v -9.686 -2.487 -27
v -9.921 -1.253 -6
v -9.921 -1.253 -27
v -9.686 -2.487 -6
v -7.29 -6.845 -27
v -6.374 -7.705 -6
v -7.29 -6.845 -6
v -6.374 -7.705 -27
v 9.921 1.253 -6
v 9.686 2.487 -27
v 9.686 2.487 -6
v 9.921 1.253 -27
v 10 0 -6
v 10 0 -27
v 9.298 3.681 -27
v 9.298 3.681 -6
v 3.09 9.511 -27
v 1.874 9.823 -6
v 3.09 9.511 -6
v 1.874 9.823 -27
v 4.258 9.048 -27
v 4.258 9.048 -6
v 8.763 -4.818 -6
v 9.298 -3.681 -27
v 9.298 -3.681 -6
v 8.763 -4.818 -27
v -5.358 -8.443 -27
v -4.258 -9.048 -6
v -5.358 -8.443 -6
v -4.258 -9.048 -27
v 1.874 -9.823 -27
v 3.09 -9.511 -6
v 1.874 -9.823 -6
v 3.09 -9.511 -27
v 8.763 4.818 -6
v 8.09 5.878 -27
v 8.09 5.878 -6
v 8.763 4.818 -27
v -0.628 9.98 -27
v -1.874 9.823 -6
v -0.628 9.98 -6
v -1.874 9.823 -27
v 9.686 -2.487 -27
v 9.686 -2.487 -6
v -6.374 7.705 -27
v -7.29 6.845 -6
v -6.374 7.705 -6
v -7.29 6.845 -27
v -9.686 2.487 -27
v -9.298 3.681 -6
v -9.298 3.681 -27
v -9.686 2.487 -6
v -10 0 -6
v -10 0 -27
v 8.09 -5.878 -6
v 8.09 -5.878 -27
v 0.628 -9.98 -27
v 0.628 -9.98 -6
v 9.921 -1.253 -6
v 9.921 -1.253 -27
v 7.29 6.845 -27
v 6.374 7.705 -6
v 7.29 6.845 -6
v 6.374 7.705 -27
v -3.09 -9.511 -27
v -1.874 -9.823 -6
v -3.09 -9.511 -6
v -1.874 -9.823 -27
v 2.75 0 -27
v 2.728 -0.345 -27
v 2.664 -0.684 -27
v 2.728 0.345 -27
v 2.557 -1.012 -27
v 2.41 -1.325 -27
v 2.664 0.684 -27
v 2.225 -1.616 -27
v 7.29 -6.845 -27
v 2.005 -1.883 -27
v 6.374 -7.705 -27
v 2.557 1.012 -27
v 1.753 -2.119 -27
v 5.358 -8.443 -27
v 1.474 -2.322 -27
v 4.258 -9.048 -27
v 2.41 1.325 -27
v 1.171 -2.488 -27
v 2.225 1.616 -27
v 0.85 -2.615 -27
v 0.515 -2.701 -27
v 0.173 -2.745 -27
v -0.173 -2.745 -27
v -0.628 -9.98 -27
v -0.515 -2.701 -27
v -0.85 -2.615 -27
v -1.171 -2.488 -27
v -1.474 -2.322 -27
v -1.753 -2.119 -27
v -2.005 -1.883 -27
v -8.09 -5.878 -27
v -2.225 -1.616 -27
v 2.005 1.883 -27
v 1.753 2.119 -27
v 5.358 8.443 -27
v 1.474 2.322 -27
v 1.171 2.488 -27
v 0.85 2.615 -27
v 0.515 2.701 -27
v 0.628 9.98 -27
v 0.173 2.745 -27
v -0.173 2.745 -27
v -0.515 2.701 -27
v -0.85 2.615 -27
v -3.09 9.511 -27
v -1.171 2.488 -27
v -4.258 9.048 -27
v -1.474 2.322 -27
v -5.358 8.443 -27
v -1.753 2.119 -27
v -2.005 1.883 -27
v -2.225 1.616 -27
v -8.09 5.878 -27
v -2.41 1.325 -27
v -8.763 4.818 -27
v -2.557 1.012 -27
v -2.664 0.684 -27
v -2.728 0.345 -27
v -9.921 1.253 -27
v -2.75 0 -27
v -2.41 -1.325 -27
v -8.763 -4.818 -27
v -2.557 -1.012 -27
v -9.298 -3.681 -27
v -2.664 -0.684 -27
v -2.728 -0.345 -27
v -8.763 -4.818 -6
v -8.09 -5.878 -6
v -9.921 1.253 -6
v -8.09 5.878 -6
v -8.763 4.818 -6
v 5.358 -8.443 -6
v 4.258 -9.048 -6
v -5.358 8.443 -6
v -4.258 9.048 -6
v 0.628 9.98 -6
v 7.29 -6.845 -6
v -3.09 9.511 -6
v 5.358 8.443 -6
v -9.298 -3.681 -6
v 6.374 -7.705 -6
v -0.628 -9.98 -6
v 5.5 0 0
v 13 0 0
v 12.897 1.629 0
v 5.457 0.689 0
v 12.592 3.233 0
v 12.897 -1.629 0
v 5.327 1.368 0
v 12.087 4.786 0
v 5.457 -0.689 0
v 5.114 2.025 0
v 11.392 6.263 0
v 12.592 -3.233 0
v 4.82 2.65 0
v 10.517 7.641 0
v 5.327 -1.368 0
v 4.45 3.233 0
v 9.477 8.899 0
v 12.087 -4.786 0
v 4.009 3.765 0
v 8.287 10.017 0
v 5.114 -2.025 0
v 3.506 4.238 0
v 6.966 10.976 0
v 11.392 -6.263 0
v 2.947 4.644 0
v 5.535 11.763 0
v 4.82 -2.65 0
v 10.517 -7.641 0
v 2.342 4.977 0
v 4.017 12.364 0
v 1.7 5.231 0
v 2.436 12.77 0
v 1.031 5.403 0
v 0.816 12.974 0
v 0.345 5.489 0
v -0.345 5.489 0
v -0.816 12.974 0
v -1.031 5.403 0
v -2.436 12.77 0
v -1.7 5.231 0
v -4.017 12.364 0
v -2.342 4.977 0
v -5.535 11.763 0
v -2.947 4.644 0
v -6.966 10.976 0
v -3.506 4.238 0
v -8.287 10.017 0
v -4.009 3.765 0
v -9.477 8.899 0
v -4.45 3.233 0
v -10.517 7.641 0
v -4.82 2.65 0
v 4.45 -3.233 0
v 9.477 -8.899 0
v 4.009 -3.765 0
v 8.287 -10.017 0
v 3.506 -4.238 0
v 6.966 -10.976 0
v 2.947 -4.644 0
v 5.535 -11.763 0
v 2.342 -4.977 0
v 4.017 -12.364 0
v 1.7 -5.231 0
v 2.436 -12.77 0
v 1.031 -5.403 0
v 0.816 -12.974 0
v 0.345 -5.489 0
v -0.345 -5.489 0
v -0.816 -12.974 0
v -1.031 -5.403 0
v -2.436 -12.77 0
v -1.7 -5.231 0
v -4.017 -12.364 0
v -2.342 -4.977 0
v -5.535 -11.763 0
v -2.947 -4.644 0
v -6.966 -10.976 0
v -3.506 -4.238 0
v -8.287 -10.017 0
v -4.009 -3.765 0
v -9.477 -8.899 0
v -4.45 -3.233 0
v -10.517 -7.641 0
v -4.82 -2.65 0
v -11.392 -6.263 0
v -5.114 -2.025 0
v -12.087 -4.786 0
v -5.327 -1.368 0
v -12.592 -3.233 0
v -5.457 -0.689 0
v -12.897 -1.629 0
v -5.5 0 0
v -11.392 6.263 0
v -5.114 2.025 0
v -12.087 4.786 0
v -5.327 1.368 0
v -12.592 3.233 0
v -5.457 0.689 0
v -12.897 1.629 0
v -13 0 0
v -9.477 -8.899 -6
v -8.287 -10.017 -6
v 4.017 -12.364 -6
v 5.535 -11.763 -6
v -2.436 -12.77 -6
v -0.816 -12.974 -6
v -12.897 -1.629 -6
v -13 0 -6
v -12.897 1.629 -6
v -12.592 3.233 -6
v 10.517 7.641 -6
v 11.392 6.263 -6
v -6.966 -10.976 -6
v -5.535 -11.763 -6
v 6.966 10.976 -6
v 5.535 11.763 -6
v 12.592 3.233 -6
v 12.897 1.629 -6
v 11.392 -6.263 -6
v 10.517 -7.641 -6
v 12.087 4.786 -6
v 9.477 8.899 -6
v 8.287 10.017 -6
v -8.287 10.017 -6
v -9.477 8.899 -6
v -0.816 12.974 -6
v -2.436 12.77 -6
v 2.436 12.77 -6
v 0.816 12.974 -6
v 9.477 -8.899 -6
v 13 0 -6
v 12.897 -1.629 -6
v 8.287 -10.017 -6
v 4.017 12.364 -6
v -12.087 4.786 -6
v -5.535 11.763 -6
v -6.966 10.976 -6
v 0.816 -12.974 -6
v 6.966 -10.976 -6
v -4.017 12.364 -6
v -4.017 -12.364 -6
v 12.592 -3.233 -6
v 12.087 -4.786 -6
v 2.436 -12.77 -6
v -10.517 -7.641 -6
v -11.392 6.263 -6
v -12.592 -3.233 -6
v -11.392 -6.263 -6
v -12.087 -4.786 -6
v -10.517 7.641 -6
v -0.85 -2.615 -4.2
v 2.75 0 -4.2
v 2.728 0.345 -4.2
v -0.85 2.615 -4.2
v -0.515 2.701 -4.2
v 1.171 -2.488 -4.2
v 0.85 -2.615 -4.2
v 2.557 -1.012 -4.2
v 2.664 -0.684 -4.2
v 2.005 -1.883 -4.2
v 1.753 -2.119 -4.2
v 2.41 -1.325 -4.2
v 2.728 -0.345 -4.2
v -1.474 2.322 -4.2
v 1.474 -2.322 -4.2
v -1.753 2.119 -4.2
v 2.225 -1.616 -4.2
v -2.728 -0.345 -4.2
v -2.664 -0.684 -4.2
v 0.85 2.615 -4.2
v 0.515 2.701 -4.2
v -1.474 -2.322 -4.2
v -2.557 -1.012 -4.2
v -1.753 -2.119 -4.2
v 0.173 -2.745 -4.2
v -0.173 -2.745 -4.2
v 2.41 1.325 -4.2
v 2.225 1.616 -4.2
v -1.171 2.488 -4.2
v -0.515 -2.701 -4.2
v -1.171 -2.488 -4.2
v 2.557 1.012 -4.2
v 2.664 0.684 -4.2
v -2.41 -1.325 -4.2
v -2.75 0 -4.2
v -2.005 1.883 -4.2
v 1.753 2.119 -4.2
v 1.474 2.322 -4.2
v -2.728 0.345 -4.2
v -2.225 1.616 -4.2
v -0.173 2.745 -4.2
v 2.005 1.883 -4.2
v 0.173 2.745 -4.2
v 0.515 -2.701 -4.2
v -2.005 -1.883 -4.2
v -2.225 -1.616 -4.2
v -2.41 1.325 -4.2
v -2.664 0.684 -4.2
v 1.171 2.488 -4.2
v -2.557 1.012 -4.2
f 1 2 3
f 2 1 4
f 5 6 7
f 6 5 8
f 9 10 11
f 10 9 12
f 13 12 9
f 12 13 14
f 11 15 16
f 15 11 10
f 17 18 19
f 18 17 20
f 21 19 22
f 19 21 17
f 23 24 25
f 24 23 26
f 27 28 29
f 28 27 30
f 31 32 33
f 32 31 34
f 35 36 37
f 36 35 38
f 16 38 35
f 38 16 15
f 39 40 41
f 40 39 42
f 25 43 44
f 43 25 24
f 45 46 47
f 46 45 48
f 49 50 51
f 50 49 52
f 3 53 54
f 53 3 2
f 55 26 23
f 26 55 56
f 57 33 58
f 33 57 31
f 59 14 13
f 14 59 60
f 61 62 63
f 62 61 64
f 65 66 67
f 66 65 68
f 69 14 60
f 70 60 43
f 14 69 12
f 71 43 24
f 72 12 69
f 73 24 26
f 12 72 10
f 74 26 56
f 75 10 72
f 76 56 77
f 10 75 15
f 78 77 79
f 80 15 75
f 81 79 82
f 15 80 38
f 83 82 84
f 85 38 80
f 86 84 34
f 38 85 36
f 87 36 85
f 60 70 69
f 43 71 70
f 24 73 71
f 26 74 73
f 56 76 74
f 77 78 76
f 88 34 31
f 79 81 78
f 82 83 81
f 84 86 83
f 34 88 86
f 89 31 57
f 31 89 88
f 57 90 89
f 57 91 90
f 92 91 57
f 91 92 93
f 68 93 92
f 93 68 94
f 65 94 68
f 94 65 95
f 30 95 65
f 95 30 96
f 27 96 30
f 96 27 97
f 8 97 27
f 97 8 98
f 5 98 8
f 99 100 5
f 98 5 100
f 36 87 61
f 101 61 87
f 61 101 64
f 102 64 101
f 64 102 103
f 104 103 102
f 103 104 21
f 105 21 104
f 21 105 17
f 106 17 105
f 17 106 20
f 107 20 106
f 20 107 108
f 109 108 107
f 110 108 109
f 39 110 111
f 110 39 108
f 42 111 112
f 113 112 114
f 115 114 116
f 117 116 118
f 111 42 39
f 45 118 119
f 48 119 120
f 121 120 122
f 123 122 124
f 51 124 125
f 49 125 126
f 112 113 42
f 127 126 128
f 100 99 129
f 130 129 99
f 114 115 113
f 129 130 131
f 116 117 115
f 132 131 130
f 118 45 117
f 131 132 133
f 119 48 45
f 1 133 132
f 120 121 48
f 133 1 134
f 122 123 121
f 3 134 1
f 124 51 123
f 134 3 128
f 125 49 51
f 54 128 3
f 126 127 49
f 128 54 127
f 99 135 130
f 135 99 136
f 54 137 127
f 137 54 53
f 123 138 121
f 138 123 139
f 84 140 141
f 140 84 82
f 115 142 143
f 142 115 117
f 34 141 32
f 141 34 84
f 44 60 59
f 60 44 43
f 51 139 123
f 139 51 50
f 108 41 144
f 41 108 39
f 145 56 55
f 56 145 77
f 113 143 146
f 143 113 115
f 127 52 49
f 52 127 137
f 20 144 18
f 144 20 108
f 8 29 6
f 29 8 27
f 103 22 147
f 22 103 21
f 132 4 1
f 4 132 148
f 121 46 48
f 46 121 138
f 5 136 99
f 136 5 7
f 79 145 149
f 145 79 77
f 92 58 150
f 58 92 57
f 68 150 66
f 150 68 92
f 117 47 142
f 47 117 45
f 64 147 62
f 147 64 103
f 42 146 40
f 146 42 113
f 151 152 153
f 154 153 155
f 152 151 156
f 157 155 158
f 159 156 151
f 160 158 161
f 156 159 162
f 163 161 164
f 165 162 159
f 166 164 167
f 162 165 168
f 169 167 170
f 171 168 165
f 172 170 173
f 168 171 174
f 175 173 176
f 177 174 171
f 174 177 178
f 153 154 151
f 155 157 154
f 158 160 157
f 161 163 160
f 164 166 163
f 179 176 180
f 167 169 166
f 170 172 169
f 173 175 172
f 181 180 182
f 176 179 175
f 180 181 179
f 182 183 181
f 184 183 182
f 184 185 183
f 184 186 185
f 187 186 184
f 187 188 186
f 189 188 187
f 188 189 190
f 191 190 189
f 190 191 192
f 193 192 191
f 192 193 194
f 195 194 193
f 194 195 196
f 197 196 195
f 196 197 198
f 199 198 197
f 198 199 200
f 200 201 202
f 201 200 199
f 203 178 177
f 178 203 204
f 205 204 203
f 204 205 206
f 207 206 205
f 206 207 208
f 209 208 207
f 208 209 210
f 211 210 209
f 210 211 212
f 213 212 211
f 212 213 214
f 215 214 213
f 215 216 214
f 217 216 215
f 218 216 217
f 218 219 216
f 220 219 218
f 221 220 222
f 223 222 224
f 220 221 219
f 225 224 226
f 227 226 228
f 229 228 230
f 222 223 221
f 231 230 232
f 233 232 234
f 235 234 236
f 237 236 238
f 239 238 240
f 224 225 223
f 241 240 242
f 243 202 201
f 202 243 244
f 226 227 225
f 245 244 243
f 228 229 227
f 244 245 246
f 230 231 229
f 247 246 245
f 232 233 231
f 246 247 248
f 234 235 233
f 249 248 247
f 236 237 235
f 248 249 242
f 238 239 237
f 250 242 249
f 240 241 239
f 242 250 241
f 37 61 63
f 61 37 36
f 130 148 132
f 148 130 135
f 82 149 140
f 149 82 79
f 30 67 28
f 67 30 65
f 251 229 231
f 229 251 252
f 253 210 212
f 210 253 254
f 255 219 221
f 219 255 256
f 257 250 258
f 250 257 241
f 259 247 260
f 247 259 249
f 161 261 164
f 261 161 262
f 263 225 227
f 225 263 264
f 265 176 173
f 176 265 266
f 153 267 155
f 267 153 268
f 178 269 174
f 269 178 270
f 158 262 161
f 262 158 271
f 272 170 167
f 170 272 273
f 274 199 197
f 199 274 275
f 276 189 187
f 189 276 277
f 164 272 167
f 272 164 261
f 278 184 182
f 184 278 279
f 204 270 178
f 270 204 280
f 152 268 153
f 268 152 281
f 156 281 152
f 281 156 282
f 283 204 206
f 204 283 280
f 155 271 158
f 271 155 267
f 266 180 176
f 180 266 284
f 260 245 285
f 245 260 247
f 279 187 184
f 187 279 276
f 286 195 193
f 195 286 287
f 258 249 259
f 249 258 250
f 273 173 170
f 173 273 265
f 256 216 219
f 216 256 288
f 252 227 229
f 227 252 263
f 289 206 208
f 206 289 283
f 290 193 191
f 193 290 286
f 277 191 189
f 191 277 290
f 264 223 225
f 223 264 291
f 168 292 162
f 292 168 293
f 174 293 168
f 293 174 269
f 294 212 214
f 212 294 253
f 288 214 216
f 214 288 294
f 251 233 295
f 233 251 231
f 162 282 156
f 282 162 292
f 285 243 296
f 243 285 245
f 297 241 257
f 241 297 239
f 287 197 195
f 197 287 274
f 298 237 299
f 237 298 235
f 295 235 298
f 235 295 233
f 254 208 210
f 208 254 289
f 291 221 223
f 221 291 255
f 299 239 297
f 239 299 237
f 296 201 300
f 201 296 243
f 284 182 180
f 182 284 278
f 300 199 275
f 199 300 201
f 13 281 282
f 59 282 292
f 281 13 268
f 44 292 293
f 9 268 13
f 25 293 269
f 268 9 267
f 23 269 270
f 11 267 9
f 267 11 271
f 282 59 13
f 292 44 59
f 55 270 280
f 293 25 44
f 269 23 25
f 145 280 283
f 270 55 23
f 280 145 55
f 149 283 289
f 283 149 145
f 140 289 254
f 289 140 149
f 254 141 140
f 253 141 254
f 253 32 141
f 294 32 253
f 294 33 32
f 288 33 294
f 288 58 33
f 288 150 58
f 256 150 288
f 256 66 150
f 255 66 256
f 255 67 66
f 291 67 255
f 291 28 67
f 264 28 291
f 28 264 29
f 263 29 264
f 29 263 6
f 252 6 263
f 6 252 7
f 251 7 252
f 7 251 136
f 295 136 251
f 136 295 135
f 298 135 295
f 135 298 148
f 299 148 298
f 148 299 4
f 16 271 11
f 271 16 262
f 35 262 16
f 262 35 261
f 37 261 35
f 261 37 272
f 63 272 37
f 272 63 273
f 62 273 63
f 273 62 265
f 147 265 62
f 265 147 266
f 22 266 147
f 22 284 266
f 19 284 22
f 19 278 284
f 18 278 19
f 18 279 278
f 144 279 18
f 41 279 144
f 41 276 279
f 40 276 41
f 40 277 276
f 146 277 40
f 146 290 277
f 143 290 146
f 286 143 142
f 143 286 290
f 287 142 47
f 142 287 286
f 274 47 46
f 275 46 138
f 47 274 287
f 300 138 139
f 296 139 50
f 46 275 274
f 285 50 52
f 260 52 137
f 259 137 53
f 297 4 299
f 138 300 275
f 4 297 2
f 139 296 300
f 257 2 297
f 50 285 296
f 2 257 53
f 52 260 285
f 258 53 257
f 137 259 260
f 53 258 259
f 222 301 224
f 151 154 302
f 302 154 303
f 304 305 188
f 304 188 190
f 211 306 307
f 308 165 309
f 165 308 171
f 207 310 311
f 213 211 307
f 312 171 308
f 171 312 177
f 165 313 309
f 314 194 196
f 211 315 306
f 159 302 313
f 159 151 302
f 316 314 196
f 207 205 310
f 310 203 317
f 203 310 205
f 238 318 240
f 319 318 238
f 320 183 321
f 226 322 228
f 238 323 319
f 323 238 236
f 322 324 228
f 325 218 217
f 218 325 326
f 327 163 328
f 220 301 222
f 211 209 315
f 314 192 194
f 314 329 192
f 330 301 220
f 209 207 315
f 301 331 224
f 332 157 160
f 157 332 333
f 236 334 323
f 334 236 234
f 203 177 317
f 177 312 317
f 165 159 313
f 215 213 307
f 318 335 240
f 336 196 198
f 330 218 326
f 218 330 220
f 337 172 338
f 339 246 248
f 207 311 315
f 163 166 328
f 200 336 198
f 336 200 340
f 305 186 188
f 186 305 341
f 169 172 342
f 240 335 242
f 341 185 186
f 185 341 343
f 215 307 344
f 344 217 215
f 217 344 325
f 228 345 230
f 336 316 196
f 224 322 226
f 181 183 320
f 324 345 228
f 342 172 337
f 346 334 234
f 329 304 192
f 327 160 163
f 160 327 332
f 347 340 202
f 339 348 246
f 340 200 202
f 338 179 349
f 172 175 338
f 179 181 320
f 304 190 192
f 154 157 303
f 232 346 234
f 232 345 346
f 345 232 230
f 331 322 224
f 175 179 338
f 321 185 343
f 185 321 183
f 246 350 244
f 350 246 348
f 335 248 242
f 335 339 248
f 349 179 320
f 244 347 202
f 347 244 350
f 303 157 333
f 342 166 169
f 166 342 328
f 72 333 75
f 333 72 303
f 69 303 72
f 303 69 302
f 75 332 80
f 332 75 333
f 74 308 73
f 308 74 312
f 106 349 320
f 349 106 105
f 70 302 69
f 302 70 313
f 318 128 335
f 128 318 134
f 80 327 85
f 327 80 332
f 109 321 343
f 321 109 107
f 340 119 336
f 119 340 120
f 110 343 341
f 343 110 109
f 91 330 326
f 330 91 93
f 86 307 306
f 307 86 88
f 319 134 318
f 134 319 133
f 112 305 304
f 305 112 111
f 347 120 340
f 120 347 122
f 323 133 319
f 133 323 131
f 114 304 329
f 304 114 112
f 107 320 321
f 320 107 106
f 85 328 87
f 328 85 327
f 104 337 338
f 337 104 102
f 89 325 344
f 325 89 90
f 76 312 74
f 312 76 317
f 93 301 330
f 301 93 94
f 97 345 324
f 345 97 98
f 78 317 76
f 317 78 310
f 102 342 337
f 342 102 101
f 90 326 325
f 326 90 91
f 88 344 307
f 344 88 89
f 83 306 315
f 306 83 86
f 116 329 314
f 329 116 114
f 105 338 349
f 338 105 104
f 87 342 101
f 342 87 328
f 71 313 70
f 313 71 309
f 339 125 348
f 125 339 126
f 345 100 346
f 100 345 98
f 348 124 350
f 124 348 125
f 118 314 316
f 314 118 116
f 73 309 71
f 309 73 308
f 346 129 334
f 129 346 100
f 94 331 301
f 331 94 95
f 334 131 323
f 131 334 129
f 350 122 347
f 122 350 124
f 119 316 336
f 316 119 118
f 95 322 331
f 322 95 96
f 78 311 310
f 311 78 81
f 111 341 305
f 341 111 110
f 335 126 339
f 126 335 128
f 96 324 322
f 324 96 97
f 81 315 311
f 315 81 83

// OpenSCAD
$fn = 50;


difference() {
	union() {
		translate(v = [0, 0, -27.0000000000]) {
			cylinder(h = 27, r = 10.0000000000);
		}
		translate(v = [0, 0, -6.0000000000]) {
			cylinder(h = 6, r = 13.0000000000);
		}
	}
	union() {
		translate(v = [0, 0, 0]) {
			rotate(a = [0, 0, 0]) {
				difference() {
					union() {
						#translate(v = [0, 0, -27.0000000000]) {
							cylinder(h = 27, r = 2.2500000000);
						}
						#translate(v = [0, 0, -4.2000000000]) {
							cylinder(h = 4.2000000000, r1 = 2.7500000000, r2 = 5.5000000000);
						}
						#translate(v = [0, 0, -27.0000000000]) {
							cylinder(h = 27, r = 2.7500000000);
						}
						#translate(v = [0, 0, -27.0000000000]) {
							cylinder(h = 27, r = 2.2500000000);
						}
					}
					union();
				}
			}
		}
	}
}
